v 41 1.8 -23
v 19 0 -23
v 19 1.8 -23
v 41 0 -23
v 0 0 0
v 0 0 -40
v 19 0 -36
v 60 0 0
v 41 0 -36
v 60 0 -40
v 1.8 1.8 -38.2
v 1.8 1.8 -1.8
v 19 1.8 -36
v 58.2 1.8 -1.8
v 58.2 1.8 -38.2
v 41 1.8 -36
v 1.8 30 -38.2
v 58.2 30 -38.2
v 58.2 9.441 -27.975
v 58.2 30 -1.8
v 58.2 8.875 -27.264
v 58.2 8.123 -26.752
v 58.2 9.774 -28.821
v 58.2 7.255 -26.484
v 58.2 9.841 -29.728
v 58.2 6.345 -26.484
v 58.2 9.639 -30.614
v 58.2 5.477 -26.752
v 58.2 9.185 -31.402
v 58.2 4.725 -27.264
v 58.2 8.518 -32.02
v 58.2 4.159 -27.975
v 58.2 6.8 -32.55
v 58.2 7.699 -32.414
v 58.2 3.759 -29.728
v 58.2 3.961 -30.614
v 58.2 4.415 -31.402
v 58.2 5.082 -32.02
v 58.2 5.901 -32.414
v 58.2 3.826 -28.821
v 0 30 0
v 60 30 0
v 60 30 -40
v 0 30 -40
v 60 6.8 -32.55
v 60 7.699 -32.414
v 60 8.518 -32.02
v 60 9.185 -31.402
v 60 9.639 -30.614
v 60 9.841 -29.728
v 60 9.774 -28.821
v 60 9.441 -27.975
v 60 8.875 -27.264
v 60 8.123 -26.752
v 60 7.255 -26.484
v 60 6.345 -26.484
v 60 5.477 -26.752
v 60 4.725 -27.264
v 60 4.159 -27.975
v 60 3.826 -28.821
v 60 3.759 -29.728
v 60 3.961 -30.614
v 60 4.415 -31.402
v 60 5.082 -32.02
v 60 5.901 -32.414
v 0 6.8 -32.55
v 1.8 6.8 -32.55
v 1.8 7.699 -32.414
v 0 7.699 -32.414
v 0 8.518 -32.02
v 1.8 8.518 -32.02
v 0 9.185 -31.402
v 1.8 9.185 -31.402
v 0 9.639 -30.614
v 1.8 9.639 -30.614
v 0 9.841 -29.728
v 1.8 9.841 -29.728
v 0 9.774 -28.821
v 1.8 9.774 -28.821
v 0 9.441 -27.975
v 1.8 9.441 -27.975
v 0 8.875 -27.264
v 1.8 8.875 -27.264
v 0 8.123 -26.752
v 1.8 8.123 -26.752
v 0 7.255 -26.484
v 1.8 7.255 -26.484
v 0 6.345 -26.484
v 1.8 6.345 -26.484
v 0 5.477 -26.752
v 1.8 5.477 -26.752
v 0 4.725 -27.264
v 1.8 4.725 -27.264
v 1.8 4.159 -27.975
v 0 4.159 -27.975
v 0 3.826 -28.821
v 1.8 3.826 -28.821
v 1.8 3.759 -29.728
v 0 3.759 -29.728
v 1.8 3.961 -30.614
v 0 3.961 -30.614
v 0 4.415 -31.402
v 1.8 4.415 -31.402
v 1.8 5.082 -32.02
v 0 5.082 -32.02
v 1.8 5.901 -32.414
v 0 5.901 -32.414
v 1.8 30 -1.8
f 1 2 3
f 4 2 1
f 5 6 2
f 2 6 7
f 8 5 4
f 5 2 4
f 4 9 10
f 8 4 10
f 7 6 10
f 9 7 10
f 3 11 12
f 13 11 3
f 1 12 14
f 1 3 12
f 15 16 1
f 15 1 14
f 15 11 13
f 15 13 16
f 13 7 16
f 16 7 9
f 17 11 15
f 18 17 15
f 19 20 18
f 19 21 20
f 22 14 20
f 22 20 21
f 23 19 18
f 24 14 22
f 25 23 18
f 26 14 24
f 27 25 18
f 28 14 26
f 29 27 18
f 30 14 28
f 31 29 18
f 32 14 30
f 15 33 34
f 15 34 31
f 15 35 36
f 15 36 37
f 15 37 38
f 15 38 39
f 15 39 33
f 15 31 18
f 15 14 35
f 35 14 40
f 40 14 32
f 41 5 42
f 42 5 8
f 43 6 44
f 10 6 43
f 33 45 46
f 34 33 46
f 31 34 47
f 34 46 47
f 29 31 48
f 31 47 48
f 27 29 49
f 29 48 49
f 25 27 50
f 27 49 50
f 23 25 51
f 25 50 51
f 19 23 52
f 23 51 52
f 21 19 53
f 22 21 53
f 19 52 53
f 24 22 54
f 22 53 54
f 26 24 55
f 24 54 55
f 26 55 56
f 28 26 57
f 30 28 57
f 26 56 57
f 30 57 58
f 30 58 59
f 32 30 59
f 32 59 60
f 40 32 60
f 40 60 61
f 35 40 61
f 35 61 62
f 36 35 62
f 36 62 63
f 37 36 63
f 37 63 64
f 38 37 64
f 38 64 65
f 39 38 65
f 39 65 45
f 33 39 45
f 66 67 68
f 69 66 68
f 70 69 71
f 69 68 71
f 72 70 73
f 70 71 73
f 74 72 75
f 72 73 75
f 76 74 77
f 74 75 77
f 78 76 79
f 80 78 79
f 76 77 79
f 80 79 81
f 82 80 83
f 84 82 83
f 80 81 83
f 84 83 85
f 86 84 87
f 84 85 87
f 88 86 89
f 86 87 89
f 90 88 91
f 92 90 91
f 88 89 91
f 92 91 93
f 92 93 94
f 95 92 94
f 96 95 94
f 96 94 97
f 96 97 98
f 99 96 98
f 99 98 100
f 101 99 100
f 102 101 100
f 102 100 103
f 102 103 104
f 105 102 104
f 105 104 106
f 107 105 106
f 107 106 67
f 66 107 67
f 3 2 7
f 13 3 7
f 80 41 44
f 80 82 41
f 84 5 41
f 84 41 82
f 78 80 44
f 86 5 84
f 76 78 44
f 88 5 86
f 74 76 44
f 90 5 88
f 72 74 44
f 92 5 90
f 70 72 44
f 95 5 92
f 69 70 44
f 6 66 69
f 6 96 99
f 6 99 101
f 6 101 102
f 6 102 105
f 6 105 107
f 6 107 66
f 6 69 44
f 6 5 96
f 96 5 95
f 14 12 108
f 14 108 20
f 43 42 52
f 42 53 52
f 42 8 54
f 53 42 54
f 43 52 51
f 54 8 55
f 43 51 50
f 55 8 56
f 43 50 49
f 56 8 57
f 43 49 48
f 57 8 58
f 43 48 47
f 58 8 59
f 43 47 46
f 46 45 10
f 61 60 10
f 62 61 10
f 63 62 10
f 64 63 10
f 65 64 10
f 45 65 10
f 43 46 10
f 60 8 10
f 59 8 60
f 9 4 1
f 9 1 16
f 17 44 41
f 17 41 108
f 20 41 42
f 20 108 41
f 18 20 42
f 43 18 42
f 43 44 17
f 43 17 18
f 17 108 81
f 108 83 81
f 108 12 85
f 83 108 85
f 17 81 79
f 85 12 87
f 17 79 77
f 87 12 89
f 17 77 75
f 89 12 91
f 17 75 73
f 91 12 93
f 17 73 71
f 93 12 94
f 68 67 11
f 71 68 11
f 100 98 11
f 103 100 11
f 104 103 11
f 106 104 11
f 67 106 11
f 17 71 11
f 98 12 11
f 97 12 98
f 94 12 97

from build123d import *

# Parameters (mm, degrees)
SKETCH2_W             = 60
SKETCH2_H             = 40
BOSS_EXTRUDE1_DEPTH   = 30
SHELL2_T              = -1.8
SKETCH2_6_W           = 22
SKETCH2_6_H           = 13
CUT_EXTRUDE4_DEPTH    = 30
F_6_0MM_DOWEL_HOLE1_D = 6.1


with BuildPart() as part:
    # Sketch2 → Boss-Extrude1 (new body)
    with BuildSketch(Plane(origin=(0, 0, 0), x_dir=(1, 0, 0), z_dir=(0, 1, 0))):
        with Locations((30, 20)):
            Rectangle(SKETCH2_W, SKETCH2_H)
    extrude(amount=BOSS_EXTRUDE1_DEPTH)

    # Shell2
    shell2_openings = [part.faces().sort_by_distance(p)[0] for p in [
        (30, 30, -20),
    ]]
    offset(amount=SHELL2_T, openings=shell2_openings, kind=Kind.INTERSECTION)

    # Sketch2<6> → Cut-Extrude4 (cut)
    with BuildSketch(Plane(origin=(0, 0, 0), x_dir=(1, 0, 0), z_dir=(0, 1, 0))):
        with Locations((30, 29.5)):
            Rectangle(SKETCH2_6_W, SKETCH2_6_H)
    extrude(amount=CUT_EXTRUDE4_DEPTH, mode=Mode.SUBTRACT)

    # Ø6.0mm Dowel Hole1 (through all)
    with Locations(Plane.ZY):
        with Locations((-29.5, 6.8)):
            Hole(F_6_0MM_DOWEL_HOLE1_D / 2)


solid = part.part
